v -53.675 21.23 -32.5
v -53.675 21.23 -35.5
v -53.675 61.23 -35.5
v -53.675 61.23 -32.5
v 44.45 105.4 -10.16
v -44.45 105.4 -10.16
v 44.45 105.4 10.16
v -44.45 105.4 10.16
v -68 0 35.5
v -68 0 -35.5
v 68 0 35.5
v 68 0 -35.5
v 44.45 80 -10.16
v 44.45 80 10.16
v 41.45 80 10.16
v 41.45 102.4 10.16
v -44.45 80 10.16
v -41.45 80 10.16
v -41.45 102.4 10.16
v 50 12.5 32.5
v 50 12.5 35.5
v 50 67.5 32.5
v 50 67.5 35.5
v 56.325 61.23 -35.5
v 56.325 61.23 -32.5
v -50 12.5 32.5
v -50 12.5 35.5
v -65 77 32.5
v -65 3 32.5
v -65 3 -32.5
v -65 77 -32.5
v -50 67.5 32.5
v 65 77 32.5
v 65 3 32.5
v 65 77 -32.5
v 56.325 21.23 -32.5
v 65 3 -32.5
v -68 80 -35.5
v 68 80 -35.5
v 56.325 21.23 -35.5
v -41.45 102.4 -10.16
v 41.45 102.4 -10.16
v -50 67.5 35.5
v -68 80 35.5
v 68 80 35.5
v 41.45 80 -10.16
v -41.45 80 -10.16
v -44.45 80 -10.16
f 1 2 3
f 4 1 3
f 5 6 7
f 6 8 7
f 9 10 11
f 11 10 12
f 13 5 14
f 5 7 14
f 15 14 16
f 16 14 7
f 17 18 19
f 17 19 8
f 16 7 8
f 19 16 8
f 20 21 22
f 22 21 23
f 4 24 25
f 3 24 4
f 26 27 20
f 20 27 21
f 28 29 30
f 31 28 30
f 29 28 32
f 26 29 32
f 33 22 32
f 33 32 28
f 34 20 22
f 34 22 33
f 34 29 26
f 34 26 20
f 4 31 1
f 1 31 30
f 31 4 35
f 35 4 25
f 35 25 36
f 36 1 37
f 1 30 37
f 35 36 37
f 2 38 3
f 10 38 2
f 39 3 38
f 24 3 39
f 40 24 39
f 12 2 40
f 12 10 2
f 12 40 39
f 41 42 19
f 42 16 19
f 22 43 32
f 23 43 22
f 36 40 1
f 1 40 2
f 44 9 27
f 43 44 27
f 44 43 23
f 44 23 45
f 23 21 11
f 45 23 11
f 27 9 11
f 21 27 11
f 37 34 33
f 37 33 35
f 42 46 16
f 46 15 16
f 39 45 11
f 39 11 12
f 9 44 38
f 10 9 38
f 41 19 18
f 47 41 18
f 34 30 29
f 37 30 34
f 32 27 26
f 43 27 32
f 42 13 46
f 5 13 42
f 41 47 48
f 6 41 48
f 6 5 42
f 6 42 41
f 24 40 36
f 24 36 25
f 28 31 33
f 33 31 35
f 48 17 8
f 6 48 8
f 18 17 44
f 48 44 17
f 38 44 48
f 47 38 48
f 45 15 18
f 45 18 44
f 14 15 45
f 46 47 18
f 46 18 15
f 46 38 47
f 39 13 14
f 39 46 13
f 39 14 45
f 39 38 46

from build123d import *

# Parameters (mm, degrees)
SKETCH1_W           = 136
SKETCH1_H           = 71
BOSS_EXTRUDE2_DEPTH = 80
SHELL5_T            = -3
SKETCH2_W           = 130
SKETCH2_H           = 3
BOSS_EXTRUDE3_DEPTH = 74
BOSS_EXTRUDE4_DEPTH = 10.16
SKETCH7_W           = 100
SKETCH7_H           = 55
CUT_EXTRUDE1_DEPTH  = 10
SKETCH8_W           = 110
SKETCH8_H           = 40
CUT_EXTRUDE2_DEPTH  = 10


with BuildPart() as part:
    # Sketch1 → Boss-Extrude2 (new body)
    with BuildSketch(Plane(origin=(0, 0, 0), x_dir=(1, 0, 0), z_dir=(0, 1, 0))):
        Rectangle(SKETCH1_W, SKETCH1_H)
    extrude(amount=BOSS_EXTRUDE2_DEPTH)

    # Shell5
    shell5_openings = [part.faces().sort_by_distance(p)[0] for p in [
        (0, 40, 35.5),
    ]]
    offset(amount=SHELL5_T, openings=shell5_openings, kind=Kind.INTERSECTION)

    # Sketch2 → Boss-Extrude3 (add)
    with BuildSketch(Plane(origin=(0, 3, 0), x_dir=(1, 0, 0), z_dir=(0, 1, 0))):
        with Locations((0, -34)):
            Rectangle(SKETCH2_W, SKETCH2_H)
    extrude(amount=BOSS_EXTRUDE3_DEPTH)

    # Sketch4 → Boss-Extrude4 (add, symmetric)
    with BuildSketch(Plane.XY):
        Polygon((-44.45, 80), (-44.45, 105.4), (44.45, 105.4), (44.45, 80), (41.45, 80), (41.45, 102.4), (-41.45, 102.4), (-41.45, 80), align=None)
    extrude(amount=BOSS_EXTRUDE4_DEPTH, both=True)

    # Sketch7 → Cut-Extrude1 (cut)
    with BuildSketch(Plane.XY.offset(35.5)):
        with Locations((0, 40)):
            Rectangle(SKETCH7_W, SKETCH7_H)
    extrude(amount=-CUT_EXTRUDE1_DEPTH, mode=Mode.SUBTRACT)

    # Sketch8 → Cut-Extrude2 (cut)
    with BuildSketch(Plane(origin=(0, 0, -35.5), x_dir=(-1, 0, 0), z_dir=(0, 0, -1))):
        with Locations((-1.324990804, 41.229977006)):
            Rectangle(SKETCH8_W, SKETCH8_H)
    extrude(amount=-CUT_EXTRUDE2_DEPTH, mode=Mode.SUBTRACT)


solid = part.part
